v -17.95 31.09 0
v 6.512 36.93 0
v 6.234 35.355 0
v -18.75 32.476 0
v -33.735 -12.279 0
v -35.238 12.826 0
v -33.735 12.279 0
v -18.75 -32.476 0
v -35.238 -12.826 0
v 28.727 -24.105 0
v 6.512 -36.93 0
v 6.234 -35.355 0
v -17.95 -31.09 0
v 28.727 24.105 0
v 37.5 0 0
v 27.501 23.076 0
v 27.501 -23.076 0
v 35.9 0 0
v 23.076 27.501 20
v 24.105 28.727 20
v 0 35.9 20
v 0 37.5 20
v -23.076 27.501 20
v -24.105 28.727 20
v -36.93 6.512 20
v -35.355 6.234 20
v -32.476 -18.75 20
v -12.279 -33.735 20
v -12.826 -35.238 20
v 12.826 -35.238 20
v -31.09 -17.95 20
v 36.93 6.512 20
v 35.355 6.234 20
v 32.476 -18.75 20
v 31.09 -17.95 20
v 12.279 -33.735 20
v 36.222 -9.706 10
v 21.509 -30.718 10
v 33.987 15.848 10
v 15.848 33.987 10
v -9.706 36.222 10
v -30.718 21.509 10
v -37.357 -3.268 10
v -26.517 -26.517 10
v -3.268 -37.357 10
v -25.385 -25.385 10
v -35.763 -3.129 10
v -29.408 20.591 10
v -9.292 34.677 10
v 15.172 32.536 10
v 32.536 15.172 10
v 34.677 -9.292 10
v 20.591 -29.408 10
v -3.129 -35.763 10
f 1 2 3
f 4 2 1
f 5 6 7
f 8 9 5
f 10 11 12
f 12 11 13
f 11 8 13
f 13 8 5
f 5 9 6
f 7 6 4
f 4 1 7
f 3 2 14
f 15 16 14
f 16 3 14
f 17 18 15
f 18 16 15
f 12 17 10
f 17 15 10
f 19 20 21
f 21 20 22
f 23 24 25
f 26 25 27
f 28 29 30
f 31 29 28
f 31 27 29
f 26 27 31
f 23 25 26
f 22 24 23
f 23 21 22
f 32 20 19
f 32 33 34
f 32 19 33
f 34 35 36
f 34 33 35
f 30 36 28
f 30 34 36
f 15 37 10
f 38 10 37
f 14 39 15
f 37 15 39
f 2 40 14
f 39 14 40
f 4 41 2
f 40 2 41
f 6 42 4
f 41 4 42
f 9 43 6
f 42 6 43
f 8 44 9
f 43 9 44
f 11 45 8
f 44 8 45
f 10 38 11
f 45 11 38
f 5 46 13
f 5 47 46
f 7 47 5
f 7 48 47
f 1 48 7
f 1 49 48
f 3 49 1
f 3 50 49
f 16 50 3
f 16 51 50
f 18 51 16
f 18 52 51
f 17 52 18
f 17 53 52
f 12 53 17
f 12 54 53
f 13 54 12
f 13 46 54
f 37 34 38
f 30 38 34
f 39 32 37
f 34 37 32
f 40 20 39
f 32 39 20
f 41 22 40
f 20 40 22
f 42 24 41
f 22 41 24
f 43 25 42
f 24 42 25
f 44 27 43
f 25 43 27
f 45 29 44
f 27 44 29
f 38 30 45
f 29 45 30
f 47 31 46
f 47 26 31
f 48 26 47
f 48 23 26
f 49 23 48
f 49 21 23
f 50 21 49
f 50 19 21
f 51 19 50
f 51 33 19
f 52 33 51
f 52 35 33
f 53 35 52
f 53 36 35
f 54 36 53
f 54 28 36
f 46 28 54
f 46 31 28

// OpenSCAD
//General Parameters 

// filled / solid for slicing in vase mode
fill = "no"; //[yes,no]
// Base radius in mm
outerRadius = 37.5; //[10:300]
// Height in mm
height = 20; //[30:600] 
// number of sides that make up the outside (bigger than 3)
sides = 9; //
//Thickness of wall
wallThickness = 1.6; //[1:50]
// degree to twist between base and top
degree2twist = 30; //[0:360] 0 for no twist
// how many slices? 
numberSlices = 2; //[0:100]


//General Calculated Values
innerRadius = outerRadius - wallThickness; 
extrudeHeight = height;


module rim(filled){
difference(){
    circle(r=outerRadius, $fn=sides);
    if(filled=="no"){
        circle(r=innerRadius, $fn = sides);
        }
    }
}

module bracelet(){
    linear_extrude(height = extrudeHeight, twist=degree2twist, slices = numberSlices) rim(filled=fill);
}

bracelet();
